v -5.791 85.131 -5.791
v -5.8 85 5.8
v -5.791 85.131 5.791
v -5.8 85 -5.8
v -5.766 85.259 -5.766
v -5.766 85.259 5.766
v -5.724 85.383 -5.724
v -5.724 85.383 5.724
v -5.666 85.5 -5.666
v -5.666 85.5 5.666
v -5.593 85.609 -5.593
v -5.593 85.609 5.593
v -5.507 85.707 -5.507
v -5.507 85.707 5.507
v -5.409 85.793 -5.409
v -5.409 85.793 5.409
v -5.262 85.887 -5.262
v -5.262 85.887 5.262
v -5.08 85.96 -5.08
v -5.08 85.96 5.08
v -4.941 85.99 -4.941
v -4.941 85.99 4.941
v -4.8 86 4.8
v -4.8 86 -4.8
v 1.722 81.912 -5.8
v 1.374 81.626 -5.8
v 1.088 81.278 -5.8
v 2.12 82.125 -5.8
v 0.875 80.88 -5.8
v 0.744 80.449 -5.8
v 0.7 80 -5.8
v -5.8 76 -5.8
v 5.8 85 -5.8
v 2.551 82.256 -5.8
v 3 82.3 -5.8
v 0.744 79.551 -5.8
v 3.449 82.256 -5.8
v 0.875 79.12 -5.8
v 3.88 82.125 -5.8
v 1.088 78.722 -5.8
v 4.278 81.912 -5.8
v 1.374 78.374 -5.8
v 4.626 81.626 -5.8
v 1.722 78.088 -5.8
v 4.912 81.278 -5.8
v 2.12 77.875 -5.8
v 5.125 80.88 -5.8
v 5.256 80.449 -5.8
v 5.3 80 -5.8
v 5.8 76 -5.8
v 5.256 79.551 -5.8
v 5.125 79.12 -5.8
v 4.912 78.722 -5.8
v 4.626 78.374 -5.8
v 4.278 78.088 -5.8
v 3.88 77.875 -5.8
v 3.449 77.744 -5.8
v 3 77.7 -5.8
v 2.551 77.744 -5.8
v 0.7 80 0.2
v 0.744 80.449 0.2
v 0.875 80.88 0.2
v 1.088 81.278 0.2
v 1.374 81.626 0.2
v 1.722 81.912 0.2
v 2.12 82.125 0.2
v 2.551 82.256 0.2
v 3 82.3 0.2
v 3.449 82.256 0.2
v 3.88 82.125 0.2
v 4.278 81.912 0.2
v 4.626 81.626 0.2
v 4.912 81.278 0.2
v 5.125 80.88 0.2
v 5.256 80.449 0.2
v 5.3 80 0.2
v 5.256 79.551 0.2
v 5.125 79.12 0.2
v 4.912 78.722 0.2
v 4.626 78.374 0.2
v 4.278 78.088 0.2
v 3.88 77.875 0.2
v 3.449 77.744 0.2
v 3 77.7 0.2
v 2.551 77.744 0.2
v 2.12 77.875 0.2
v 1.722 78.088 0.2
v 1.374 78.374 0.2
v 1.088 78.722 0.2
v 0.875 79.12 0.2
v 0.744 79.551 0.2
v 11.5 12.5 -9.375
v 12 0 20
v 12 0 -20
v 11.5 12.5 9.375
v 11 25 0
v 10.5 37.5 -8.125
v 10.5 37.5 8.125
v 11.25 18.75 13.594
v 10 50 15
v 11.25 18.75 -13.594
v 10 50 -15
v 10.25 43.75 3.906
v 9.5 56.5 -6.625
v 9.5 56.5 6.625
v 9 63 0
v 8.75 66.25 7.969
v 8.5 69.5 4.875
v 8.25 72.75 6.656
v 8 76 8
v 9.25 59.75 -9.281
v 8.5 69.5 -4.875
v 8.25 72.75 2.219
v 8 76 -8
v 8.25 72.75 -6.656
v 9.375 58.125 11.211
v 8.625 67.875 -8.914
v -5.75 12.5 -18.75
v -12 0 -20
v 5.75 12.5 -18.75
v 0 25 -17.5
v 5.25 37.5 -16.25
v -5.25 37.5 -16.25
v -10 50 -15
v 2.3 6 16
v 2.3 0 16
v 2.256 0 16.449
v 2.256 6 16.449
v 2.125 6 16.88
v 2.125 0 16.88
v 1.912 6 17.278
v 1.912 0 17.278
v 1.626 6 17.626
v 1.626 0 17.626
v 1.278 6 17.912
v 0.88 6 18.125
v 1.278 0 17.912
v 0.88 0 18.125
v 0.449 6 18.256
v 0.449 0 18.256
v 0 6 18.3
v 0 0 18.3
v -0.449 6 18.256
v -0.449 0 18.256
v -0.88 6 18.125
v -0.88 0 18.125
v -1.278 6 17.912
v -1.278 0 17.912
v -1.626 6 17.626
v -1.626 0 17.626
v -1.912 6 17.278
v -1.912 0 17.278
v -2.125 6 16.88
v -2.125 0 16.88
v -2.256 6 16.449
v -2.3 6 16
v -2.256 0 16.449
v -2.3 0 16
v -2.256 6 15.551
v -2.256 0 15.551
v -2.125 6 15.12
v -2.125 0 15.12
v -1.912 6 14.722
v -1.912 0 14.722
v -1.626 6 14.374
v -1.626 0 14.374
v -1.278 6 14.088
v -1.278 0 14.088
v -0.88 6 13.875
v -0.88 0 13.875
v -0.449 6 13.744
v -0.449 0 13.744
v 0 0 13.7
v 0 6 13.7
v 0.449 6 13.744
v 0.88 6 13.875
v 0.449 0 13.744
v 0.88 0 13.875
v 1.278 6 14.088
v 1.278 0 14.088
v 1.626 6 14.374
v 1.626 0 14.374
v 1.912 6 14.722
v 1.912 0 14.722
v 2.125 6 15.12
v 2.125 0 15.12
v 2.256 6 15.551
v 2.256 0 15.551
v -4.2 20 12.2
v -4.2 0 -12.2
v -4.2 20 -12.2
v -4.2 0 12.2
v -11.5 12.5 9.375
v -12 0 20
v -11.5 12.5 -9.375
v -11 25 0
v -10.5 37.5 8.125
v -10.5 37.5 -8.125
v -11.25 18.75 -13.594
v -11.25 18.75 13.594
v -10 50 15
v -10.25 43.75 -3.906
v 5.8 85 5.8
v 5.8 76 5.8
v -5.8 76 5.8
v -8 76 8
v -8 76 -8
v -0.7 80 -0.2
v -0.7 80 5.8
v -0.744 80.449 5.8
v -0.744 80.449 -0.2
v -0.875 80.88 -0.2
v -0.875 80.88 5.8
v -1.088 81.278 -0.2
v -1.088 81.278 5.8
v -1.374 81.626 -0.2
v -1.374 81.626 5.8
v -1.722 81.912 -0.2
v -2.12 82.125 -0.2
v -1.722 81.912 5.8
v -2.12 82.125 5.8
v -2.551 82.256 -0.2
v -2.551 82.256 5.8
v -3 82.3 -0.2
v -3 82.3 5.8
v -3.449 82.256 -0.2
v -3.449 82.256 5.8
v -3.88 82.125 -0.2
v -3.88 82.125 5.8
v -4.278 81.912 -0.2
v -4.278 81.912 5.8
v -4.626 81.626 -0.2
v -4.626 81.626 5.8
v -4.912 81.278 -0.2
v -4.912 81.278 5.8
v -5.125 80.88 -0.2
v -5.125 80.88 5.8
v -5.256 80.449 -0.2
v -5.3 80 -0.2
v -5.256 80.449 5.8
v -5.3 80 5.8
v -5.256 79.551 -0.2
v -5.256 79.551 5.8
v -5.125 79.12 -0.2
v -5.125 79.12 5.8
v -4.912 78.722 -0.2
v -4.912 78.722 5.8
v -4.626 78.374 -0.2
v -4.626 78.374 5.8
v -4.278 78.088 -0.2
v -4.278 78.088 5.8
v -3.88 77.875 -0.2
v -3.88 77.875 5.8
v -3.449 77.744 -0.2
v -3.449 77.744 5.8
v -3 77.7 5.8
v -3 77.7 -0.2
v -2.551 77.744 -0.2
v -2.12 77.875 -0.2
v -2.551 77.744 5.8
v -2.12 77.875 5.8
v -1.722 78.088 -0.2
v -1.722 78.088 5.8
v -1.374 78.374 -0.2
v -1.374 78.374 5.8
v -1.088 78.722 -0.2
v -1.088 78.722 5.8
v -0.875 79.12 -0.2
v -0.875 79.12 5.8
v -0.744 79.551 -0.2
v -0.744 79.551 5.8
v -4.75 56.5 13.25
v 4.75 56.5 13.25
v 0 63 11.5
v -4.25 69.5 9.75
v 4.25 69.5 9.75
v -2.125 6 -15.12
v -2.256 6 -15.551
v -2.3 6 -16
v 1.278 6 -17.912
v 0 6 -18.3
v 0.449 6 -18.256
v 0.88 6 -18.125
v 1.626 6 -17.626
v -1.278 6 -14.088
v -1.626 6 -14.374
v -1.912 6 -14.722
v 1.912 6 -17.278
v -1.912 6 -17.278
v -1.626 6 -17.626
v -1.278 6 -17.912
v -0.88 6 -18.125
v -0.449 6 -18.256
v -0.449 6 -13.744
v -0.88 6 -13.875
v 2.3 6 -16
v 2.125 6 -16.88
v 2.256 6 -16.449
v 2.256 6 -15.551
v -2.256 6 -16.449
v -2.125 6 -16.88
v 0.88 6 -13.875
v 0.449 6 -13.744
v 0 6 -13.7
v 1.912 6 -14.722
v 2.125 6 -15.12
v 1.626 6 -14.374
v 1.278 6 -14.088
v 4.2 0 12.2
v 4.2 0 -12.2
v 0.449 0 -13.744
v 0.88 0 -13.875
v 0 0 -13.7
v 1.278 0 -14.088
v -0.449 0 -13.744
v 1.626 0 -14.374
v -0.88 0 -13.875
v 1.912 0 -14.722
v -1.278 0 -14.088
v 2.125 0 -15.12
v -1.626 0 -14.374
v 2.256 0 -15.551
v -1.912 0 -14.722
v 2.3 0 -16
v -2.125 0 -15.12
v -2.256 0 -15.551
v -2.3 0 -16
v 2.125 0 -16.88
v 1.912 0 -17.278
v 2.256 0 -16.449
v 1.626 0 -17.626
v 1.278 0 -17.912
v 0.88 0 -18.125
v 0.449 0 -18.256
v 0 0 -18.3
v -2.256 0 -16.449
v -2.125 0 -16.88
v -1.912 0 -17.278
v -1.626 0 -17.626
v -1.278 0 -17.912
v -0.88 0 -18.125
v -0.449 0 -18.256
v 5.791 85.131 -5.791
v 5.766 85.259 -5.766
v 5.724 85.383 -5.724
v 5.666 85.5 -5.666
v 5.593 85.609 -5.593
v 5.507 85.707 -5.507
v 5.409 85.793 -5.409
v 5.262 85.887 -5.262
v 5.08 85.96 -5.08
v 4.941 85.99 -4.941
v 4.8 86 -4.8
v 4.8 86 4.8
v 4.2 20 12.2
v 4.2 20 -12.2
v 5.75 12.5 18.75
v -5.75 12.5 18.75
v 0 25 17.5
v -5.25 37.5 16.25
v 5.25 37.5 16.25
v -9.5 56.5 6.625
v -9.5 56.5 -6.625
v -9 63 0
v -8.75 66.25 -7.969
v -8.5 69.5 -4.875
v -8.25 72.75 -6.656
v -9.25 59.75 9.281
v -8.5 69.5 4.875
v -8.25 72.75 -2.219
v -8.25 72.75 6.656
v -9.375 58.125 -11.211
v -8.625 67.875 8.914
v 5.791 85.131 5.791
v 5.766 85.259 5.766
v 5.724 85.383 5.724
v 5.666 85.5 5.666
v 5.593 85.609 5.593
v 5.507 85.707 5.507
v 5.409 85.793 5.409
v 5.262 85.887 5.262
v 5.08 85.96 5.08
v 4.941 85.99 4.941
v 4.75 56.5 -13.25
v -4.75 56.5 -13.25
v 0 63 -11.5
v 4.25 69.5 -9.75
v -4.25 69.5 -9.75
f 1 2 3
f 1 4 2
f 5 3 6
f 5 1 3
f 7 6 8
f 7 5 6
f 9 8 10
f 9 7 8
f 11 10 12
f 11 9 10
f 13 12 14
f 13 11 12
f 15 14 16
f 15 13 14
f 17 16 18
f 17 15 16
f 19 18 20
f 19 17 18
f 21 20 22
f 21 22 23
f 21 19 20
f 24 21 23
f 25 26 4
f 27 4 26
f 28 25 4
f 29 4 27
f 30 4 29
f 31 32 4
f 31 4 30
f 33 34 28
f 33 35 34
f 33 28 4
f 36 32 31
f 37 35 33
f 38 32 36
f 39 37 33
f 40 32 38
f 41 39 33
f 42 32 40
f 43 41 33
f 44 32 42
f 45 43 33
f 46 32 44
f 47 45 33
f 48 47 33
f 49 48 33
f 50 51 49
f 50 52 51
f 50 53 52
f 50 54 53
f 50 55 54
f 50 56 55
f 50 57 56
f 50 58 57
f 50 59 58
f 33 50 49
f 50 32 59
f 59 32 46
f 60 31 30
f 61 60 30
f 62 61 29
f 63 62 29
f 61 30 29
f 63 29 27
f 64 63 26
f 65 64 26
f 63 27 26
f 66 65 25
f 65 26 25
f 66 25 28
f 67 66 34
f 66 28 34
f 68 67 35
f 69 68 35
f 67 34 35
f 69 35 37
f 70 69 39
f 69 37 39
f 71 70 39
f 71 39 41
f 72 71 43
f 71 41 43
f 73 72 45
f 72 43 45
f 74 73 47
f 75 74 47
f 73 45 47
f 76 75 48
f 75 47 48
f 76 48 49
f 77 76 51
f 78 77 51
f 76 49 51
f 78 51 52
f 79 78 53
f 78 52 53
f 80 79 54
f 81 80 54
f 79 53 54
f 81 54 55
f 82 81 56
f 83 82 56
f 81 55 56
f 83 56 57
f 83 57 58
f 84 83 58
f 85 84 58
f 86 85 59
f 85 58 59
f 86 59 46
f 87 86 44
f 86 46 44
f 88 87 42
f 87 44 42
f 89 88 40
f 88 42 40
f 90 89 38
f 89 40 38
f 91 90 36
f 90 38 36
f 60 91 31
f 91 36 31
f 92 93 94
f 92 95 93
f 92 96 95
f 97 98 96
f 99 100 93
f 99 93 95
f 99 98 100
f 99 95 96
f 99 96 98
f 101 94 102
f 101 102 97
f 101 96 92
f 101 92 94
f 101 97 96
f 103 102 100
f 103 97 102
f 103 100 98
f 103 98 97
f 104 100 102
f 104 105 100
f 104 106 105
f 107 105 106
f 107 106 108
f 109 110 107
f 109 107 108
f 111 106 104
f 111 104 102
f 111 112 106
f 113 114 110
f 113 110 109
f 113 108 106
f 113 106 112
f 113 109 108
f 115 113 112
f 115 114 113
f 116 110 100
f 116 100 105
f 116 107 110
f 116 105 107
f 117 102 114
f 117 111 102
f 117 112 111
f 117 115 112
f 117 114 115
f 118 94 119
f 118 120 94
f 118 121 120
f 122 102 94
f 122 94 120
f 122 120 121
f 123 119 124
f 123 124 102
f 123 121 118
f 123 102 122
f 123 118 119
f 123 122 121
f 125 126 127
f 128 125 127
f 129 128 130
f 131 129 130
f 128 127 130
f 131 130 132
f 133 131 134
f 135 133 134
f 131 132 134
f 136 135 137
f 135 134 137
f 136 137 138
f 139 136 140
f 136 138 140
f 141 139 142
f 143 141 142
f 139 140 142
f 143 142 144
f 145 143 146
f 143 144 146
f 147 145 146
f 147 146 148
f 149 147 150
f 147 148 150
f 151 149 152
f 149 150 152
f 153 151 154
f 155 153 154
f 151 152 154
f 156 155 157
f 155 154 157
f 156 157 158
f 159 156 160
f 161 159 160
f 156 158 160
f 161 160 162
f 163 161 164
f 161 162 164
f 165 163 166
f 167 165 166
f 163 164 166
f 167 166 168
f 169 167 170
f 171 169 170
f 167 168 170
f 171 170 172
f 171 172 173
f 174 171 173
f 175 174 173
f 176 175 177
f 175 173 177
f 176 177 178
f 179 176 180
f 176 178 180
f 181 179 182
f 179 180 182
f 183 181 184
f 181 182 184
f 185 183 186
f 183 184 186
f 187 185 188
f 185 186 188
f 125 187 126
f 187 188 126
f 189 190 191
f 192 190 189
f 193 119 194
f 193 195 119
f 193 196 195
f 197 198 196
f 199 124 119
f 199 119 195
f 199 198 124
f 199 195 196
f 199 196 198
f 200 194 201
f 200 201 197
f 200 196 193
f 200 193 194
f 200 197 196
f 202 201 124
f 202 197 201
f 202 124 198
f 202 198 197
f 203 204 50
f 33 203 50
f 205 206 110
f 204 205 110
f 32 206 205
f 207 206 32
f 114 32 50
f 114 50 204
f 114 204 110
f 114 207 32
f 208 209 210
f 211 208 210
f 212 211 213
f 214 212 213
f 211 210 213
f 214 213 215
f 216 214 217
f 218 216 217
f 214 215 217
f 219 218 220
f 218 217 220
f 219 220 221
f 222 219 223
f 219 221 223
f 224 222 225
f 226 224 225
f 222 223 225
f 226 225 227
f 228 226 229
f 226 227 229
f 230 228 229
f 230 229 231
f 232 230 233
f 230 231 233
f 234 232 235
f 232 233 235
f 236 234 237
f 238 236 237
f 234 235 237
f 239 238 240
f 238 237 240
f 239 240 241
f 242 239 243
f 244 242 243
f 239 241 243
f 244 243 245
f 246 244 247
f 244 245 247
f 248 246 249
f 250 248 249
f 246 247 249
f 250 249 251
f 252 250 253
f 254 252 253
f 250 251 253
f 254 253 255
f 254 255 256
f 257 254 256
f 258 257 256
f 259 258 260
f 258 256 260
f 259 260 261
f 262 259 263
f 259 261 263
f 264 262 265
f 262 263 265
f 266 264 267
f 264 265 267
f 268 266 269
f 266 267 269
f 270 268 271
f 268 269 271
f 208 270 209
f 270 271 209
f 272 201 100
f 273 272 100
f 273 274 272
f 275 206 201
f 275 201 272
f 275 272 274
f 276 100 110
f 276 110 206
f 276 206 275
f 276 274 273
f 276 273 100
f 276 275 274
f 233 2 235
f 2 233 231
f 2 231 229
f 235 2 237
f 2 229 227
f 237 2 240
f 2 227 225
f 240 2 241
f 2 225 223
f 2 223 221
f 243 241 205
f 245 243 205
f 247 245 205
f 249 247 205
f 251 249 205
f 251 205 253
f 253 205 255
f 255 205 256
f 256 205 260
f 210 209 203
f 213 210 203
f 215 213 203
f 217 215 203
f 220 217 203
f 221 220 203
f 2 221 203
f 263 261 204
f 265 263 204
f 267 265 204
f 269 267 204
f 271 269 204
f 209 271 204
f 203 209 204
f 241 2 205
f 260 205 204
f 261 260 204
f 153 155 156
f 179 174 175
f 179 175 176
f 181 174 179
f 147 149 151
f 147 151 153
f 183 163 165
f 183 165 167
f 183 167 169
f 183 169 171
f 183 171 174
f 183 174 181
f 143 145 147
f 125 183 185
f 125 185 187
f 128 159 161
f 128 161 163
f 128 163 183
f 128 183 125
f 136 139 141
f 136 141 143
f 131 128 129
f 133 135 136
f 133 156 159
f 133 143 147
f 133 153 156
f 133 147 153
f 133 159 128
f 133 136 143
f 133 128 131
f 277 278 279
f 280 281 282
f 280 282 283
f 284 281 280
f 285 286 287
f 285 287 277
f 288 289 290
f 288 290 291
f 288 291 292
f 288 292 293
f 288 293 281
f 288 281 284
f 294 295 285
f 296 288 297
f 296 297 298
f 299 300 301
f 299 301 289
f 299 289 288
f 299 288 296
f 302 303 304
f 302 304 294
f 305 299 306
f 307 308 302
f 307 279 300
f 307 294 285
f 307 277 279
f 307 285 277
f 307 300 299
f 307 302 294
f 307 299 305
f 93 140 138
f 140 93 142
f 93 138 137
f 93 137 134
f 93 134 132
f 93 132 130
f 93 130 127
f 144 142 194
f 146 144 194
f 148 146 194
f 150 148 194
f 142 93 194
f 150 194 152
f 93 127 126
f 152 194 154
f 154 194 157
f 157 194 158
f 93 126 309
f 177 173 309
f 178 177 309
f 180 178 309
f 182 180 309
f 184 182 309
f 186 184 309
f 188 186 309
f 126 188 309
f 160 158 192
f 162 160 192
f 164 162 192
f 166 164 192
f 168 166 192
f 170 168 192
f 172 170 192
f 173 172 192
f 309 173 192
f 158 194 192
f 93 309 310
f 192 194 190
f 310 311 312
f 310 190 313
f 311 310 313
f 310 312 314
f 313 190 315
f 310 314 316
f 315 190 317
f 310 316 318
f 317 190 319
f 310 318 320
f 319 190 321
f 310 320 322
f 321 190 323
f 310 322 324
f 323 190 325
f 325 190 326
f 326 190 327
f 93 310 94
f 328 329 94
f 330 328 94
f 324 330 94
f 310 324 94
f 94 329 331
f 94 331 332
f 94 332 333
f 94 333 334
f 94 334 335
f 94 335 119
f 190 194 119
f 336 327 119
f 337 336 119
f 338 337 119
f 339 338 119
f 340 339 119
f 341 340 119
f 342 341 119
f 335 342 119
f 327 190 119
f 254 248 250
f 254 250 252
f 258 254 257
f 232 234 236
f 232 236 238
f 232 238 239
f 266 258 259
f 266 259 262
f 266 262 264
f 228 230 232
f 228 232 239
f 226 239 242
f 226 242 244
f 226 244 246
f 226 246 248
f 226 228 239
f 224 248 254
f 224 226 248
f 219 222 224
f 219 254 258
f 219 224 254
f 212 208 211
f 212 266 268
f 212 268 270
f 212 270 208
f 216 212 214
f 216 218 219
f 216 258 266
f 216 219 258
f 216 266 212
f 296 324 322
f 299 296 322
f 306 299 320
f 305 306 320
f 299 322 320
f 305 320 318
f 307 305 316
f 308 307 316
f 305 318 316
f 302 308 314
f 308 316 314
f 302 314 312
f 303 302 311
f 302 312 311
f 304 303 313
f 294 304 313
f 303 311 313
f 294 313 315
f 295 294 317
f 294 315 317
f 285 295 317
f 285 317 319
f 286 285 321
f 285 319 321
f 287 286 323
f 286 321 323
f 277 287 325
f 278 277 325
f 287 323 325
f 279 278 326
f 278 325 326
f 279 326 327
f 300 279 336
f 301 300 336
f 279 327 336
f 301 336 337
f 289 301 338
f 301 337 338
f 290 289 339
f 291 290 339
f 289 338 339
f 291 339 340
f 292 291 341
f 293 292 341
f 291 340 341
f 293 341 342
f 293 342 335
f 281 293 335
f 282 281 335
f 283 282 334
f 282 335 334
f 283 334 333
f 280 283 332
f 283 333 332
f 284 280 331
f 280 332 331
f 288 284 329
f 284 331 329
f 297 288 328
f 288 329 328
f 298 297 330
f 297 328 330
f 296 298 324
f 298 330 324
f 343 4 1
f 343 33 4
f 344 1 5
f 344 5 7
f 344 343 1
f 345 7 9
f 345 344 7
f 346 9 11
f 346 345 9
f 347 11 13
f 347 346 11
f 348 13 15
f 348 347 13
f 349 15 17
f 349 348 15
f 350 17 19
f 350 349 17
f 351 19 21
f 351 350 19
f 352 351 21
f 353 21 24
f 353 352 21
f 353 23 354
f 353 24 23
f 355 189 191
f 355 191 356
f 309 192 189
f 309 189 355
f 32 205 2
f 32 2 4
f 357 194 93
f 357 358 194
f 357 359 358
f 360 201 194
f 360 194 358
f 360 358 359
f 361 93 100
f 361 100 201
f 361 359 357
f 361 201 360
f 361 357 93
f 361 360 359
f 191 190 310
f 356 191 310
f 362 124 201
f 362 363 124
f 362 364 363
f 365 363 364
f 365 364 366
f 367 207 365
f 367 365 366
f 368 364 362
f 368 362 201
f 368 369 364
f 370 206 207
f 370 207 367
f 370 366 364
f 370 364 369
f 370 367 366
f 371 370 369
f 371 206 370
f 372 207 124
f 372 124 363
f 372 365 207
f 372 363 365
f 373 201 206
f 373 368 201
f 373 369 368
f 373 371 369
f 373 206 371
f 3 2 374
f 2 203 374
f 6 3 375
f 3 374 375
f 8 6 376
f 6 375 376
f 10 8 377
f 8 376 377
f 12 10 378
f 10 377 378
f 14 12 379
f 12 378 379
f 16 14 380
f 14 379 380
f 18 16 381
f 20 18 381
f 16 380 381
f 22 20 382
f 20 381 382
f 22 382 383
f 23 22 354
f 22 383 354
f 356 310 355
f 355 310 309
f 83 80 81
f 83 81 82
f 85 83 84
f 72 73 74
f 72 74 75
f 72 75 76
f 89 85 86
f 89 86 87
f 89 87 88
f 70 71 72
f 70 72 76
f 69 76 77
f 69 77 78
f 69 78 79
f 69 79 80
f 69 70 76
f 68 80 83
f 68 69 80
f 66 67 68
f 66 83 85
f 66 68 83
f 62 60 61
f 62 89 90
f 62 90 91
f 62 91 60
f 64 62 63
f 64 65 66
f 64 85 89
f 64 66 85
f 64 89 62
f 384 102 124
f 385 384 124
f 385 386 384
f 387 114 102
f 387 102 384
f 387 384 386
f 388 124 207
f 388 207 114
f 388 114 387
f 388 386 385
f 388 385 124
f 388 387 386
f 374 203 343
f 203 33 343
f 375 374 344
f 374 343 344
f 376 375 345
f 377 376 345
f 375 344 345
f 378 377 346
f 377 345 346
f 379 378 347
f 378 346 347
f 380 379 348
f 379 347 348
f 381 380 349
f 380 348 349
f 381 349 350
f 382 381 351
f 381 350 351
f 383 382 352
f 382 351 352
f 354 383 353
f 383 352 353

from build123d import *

# Parameters (mm, degrees)
SKETCH1_W           = 24
SKETCH1_H           = 40
SKETCH2_W           = 20
SKETCH2_H           = 30
SKETCH3_W           = 20
SKETCH3_H           = 30
SKETCH4_W           = 16
SKETCH4_H           = 16
SKETCH5_W           = 11.6
SKETCH5_H           = 11.6
BOSS_EXTRUDE1_DEPTH = 10
SKETCH6_R           = 2.3
CUT_EXTRUDE1_DEPTH  = 6
SKETCH7_R           = 2.3
CUT_EXTRUDE2_DEPTH  = 6
FILLET1_R           = 1
SKETCH8_W           = 8.4
SKETCH8_H           = 24.4
CUT_EXTRUDE3_DEPTH  = 20
SKETCH9_R           = 2.3
CUT_EXTRUDE4_DEPTH  = 6


with BuildPart() as part:
    # Sketch1 → Loft1 section 0
    with BuildSketch(Plane(origin=(0, 0, 0), x_dir=(1, 0, 0), z_dir=(0, 1, 0))):
        Rectangle(SKETCH1_W, SKETCH1_H)
    # Sketch2 → Loft1 section 1
    with BuildSketch(Plane(origin=(0, 50, 0), x_dir=(1, 0, 0), z_dir=(0, 1, 0))):
        Rectangle(SKETCH2_W, SKETCH2_H)
    loft()

    # Sketch3 → Loft2 section 0
    with BuildSketch(Plane(origin=(0, 50, 0), x_dir=(1, 0, 0), z_dir=(0, 1, 0))):
        Rectangle(SKETCH3_W, SKETCH3_H)
    # Sketch4 → Loft2 section 1
    with BuildSketch(Plane(origin=(0, 76, 0), x_dir=(1, 0, 0), z_dir=(0, 1, 0))):
        Rectangle(SKETCH4_W, SKETCH4_H)
    loft()

    # Sketch5 → Boss-Extrude1 (add)
    with BuildSketch(Plane(origin=(0, 76, 0), x_dir=(1, 0, 0), z_dir=(0, 1, 0))):
        Rectangle(SKETCH5_W, SKETCH5_H)
    extrude(amount=BOSS_EXTRUDE1_DEPTH)

    # Sketch6 → Cut-Extrude1 (cut)
    with BuildSketch(Plane.XY.offset(5.8)):
        with Locations((-3, 80)):
            Circle(SKETCH6_R)
    extrude(amount=-CUT_EXTRUDE1_DEPTH, mode=Mode.SUBTRACT)

    # Sketch7 → Cut-Extrude2 (cut)
    with BuildSketch(Plane(origin=(0, 0, -5.8), x_dir=(-1, 0, 0), z_dir=(0, 0, -1))):
        with Locations((-3, 80)):
            Circle(SKETCH7_R)
    extrude(amount=-CUT_EXTRUDE2_DEPTH, mode=Mode.SUBTRACT)

    # Fillet1
    fillet1_edges = [part.edges().sort_by_distance(p)[0] for p in [
        (0, 86, 5.8),
        (5.8, 86, 0),
        (0, 86, -5.8),
        (-5.8, 86, 0),
    ]]
    fillet(fillet1_edges, radius=FILLET1_R)

    # Sketch8 → Cut-Extrude3 (cut)
    with BuildSketch(Plane.XZ):
        Rectangle(SKETCH8_W, SKETCH8_H)
    extrude(amount=-CUT_EXTRUDE3_DEPTH, mode=Mode.SUBTRACT)

    # Sketch9 → Cut-Extrude4 (cut)
    with BuildSketch(Plane.XZ):
        with Locations((0, 16)):
            Circle(SKETCH9_R)
        with Locations((0, -16)):
            Circle(SKETCH9_R)
    extrude(amount=-CUT_EXTRUDE4_DEPTH, mode=Mode.SUBTRACT)


solid = part.part
